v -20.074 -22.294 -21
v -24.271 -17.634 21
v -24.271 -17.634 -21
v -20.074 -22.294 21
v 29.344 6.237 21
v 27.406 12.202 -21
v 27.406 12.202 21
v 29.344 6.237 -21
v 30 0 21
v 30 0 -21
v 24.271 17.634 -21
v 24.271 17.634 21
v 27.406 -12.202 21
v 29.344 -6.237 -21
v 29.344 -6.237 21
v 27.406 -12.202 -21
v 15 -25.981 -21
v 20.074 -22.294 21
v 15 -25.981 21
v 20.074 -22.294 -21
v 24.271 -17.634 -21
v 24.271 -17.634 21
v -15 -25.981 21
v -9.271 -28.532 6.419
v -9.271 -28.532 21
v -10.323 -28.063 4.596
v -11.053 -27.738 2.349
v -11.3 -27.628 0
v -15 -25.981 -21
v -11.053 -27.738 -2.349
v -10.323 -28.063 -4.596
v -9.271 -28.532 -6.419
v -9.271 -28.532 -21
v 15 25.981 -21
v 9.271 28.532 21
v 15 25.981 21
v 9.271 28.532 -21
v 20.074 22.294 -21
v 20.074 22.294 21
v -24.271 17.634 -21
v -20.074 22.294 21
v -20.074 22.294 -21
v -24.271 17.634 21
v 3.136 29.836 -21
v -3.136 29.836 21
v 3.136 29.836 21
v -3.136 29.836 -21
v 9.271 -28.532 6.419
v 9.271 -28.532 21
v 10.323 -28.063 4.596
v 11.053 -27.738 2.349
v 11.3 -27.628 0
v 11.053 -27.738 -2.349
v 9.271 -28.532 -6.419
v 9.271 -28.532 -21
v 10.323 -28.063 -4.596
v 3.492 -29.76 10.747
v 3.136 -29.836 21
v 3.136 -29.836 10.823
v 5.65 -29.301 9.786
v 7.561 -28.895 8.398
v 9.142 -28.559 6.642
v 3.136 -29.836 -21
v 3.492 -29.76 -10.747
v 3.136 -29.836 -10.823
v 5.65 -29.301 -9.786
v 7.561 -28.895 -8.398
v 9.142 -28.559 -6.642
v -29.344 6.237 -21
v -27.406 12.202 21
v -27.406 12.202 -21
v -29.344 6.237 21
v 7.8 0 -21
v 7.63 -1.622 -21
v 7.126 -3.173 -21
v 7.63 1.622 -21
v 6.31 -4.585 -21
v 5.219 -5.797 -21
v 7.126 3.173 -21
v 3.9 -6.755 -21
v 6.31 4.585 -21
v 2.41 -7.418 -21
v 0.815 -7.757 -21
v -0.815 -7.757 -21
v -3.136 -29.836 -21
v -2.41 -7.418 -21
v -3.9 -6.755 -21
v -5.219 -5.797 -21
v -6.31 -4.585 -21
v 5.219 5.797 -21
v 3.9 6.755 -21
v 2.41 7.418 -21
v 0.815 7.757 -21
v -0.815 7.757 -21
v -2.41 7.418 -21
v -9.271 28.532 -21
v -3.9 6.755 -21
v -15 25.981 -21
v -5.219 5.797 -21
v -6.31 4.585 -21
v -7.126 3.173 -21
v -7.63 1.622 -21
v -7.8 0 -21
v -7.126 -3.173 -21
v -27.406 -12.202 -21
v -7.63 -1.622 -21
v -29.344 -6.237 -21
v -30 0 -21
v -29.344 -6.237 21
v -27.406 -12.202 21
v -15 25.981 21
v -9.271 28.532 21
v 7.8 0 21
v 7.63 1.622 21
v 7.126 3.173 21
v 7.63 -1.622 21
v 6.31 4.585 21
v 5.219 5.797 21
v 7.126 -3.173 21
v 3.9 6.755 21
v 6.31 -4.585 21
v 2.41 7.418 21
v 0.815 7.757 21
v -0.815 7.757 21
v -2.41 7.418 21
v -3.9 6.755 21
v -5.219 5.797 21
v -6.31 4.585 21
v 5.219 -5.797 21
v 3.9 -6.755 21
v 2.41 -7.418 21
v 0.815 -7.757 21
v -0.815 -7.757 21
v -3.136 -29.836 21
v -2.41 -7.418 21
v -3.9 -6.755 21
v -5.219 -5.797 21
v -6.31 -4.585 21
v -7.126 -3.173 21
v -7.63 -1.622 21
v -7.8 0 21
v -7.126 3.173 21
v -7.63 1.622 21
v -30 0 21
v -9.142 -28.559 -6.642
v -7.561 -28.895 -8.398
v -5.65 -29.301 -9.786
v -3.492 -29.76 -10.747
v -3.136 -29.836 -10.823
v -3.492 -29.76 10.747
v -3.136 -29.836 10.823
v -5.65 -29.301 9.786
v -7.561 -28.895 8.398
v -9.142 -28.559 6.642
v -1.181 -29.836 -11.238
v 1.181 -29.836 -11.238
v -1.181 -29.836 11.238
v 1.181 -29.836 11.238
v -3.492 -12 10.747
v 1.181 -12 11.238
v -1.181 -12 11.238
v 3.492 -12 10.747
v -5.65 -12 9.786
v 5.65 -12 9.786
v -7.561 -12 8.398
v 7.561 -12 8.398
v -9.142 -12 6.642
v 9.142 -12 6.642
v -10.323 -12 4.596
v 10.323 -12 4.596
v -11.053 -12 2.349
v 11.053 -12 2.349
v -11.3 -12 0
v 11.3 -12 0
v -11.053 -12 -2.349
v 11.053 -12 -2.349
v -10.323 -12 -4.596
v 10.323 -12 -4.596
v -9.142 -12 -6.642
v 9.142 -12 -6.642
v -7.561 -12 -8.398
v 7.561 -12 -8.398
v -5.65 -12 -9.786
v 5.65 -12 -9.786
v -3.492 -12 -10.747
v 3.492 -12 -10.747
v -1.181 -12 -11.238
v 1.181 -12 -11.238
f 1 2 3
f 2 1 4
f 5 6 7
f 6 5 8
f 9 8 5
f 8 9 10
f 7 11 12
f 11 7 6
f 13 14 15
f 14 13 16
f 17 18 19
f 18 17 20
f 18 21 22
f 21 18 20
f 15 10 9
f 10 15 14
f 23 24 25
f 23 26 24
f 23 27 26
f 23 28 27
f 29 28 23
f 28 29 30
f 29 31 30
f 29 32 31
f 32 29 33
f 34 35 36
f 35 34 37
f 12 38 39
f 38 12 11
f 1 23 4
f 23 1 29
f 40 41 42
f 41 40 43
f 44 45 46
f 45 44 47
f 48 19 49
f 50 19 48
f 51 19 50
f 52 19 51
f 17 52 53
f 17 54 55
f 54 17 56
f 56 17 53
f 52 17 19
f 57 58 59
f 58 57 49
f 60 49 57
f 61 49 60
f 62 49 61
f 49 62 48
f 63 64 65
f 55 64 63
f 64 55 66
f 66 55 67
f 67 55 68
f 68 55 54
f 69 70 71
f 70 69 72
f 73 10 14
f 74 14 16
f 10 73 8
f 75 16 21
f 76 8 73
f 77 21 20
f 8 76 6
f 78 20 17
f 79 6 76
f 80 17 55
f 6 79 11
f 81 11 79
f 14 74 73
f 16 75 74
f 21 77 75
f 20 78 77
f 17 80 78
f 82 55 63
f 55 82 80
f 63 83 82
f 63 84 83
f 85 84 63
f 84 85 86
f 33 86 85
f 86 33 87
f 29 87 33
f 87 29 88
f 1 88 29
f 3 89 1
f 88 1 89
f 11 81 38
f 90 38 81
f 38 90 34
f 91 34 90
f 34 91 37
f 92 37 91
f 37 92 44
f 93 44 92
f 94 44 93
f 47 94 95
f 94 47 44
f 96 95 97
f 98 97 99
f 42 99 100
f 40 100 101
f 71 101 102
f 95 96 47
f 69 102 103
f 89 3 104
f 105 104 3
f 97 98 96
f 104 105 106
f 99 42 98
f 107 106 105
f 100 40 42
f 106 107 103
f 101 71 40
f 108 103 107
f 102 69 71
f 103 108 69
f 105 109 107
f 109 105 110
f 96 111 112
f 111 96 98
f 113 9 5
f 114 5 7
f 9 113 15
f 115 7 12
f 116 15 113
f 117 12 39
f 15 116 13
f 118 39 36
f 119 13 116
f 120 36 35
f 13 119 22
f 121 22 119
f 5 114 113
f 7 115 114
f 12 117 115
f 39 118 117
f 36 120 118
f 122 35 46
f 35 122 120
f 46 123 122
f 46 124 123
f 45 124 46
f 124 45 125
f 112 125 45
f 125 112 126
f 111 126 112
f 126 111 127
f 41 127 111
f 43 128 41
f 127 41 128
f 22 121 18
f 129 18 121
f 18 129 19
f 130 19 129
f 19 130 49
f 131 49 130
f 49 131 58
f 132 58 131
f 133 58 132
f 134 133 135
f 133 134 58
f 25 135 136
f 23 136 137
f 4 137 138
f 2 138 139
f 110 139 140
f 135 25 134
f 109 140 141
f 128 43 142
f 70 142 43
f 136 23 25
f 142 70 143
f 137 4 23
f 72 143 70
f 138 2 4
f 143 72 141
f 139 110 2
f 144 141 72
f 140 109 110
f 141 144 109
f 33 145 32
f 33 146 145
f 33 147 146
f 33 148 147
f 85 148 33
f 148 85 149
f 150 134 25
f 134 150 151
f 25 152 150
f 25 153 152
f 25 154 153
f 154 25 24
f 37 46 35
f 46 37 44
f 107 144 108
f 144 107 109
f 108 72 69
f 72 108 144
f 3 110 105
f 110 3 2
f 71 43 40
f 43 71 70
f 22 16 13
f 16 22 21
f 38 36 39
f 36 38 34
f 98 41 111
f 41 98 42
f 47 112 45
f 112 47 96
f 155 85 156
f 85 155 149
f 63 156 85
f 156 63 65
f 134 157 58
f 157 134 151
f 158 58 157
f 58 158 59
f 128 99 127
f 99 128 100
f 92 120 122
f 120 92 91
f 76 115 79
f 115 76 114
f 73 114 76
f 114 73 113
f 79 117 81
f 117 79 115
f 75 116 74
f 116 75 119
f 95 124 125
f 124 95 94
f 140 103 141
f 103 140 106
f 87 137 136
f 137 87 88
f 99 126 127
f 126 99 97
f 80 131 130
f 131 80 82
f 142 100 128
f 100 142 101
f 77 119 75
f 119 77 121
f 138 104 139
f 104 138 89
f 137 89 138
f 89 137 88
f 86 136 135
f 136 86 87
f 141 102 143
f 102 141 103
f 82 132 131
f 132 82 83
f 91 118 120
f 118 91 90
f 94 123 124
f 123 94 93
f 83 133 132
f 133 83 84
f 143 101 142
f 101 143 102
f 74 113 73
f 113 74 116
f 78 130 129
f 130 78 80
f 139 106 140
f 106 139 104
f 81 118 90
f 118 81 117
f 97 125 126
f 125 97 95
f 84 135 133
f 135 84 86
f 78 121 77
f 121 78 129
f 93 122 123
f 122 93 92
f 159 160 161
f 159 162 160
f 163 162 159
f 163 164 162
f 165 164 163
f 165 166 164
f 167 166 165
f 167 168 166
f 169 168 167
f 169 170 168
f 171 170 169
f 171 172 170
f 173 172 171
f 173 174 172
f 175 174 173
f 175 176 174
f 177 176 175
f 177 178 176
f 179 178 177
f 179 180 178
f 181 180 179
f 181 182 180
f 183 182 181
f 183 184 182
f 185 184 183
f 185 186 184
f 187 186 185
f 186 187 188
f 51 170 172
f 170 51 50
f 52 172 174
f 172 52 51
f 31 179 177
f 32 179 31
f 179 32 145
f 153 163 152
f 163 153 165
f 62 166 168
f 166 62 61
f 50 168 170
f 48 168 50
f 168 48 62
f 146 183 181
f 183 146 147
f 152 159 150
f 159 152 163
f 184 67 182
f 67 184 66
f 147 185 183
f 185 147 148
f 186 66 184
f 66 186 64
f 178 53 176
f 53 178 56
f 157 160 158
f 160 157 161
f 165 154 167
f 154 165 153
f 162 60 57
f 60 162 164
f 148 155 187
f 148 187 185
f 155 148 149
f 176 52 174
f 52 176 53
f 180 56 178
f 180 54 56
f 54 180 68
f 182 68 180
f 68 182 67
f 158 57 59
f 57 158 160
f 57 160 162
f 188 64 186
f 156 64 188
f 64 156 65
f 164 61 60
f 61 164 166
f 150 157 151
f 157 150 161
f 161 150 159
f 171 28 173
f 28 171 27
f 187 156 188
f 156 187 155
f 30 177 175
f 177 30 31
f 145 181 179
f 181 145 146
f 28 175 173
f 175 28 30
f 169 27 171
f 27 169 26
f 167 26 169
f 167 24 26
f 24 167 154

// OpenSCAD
hinge_outer = 60;
hinge_axle = 15;
hinge_width = 82;
inner_width = 42;
extrusion=0.3;
$fn = 30;
//================================================================================
//================================================================================
module hinge_fixed(){
	difference(){
		cylinder(r=hinge_outer/2, h = hinge_width, center = true);
		cylinder(r=hinge_axle/2+extrusion, h=hinge_width, center = true);
	}


}
//================================================================================
//================================================================================
module hinge_mobile(){
	difference(){
		difference(){
			cylinder(r=hinge_outer/2, h = inner_width, center = true);
			cylinder(r=hinge_axle/2+extrusion, h=inner_width, center = true);
		}
		translate([0, -(hinge_outer/2)+(18/2), 0])
		rotate([90, 0, 0])
		cylinder(r=11+extrusion, h=18, center = true);
		
	}
}
//================================================================================
//================================================================================
module base(){
difference(){
	linear_extrude(height = hinge_width, center = true, convexity = 10){
		polygon([[0,0],[60,60],[-60,60]], convexity = 10);
	}
	union(){
		translate([50, 0, 0])
		cube(size=[20, hinge_width*2, hinge_width*2], center =true);
		translate([-50, 0, 0])
		cube(size=[20, hinge_width*2, hinge_width*2], center =true);
	
	}	
	}
	translate([0, 45+5, 0])
	cube(size=[hinge_width*2, 20, hinge_width], center = true);
}
//================================================================================
//================================================================================
module subtractions(){
	difference(){
		difference(){
			base();
			cylinder(r=hinge_axle/2+extrusion, h=hinge_width, center = true);
		}
		cylinder(r=hinge_outer/2+extrusion*2, h = inner_width, center = true);
	}
}
//================================================================================
//================================================================================
/*subtractions();
difference(){
hinge_fixed();
hinge_mobile();

}*/

hinge_mobile();
